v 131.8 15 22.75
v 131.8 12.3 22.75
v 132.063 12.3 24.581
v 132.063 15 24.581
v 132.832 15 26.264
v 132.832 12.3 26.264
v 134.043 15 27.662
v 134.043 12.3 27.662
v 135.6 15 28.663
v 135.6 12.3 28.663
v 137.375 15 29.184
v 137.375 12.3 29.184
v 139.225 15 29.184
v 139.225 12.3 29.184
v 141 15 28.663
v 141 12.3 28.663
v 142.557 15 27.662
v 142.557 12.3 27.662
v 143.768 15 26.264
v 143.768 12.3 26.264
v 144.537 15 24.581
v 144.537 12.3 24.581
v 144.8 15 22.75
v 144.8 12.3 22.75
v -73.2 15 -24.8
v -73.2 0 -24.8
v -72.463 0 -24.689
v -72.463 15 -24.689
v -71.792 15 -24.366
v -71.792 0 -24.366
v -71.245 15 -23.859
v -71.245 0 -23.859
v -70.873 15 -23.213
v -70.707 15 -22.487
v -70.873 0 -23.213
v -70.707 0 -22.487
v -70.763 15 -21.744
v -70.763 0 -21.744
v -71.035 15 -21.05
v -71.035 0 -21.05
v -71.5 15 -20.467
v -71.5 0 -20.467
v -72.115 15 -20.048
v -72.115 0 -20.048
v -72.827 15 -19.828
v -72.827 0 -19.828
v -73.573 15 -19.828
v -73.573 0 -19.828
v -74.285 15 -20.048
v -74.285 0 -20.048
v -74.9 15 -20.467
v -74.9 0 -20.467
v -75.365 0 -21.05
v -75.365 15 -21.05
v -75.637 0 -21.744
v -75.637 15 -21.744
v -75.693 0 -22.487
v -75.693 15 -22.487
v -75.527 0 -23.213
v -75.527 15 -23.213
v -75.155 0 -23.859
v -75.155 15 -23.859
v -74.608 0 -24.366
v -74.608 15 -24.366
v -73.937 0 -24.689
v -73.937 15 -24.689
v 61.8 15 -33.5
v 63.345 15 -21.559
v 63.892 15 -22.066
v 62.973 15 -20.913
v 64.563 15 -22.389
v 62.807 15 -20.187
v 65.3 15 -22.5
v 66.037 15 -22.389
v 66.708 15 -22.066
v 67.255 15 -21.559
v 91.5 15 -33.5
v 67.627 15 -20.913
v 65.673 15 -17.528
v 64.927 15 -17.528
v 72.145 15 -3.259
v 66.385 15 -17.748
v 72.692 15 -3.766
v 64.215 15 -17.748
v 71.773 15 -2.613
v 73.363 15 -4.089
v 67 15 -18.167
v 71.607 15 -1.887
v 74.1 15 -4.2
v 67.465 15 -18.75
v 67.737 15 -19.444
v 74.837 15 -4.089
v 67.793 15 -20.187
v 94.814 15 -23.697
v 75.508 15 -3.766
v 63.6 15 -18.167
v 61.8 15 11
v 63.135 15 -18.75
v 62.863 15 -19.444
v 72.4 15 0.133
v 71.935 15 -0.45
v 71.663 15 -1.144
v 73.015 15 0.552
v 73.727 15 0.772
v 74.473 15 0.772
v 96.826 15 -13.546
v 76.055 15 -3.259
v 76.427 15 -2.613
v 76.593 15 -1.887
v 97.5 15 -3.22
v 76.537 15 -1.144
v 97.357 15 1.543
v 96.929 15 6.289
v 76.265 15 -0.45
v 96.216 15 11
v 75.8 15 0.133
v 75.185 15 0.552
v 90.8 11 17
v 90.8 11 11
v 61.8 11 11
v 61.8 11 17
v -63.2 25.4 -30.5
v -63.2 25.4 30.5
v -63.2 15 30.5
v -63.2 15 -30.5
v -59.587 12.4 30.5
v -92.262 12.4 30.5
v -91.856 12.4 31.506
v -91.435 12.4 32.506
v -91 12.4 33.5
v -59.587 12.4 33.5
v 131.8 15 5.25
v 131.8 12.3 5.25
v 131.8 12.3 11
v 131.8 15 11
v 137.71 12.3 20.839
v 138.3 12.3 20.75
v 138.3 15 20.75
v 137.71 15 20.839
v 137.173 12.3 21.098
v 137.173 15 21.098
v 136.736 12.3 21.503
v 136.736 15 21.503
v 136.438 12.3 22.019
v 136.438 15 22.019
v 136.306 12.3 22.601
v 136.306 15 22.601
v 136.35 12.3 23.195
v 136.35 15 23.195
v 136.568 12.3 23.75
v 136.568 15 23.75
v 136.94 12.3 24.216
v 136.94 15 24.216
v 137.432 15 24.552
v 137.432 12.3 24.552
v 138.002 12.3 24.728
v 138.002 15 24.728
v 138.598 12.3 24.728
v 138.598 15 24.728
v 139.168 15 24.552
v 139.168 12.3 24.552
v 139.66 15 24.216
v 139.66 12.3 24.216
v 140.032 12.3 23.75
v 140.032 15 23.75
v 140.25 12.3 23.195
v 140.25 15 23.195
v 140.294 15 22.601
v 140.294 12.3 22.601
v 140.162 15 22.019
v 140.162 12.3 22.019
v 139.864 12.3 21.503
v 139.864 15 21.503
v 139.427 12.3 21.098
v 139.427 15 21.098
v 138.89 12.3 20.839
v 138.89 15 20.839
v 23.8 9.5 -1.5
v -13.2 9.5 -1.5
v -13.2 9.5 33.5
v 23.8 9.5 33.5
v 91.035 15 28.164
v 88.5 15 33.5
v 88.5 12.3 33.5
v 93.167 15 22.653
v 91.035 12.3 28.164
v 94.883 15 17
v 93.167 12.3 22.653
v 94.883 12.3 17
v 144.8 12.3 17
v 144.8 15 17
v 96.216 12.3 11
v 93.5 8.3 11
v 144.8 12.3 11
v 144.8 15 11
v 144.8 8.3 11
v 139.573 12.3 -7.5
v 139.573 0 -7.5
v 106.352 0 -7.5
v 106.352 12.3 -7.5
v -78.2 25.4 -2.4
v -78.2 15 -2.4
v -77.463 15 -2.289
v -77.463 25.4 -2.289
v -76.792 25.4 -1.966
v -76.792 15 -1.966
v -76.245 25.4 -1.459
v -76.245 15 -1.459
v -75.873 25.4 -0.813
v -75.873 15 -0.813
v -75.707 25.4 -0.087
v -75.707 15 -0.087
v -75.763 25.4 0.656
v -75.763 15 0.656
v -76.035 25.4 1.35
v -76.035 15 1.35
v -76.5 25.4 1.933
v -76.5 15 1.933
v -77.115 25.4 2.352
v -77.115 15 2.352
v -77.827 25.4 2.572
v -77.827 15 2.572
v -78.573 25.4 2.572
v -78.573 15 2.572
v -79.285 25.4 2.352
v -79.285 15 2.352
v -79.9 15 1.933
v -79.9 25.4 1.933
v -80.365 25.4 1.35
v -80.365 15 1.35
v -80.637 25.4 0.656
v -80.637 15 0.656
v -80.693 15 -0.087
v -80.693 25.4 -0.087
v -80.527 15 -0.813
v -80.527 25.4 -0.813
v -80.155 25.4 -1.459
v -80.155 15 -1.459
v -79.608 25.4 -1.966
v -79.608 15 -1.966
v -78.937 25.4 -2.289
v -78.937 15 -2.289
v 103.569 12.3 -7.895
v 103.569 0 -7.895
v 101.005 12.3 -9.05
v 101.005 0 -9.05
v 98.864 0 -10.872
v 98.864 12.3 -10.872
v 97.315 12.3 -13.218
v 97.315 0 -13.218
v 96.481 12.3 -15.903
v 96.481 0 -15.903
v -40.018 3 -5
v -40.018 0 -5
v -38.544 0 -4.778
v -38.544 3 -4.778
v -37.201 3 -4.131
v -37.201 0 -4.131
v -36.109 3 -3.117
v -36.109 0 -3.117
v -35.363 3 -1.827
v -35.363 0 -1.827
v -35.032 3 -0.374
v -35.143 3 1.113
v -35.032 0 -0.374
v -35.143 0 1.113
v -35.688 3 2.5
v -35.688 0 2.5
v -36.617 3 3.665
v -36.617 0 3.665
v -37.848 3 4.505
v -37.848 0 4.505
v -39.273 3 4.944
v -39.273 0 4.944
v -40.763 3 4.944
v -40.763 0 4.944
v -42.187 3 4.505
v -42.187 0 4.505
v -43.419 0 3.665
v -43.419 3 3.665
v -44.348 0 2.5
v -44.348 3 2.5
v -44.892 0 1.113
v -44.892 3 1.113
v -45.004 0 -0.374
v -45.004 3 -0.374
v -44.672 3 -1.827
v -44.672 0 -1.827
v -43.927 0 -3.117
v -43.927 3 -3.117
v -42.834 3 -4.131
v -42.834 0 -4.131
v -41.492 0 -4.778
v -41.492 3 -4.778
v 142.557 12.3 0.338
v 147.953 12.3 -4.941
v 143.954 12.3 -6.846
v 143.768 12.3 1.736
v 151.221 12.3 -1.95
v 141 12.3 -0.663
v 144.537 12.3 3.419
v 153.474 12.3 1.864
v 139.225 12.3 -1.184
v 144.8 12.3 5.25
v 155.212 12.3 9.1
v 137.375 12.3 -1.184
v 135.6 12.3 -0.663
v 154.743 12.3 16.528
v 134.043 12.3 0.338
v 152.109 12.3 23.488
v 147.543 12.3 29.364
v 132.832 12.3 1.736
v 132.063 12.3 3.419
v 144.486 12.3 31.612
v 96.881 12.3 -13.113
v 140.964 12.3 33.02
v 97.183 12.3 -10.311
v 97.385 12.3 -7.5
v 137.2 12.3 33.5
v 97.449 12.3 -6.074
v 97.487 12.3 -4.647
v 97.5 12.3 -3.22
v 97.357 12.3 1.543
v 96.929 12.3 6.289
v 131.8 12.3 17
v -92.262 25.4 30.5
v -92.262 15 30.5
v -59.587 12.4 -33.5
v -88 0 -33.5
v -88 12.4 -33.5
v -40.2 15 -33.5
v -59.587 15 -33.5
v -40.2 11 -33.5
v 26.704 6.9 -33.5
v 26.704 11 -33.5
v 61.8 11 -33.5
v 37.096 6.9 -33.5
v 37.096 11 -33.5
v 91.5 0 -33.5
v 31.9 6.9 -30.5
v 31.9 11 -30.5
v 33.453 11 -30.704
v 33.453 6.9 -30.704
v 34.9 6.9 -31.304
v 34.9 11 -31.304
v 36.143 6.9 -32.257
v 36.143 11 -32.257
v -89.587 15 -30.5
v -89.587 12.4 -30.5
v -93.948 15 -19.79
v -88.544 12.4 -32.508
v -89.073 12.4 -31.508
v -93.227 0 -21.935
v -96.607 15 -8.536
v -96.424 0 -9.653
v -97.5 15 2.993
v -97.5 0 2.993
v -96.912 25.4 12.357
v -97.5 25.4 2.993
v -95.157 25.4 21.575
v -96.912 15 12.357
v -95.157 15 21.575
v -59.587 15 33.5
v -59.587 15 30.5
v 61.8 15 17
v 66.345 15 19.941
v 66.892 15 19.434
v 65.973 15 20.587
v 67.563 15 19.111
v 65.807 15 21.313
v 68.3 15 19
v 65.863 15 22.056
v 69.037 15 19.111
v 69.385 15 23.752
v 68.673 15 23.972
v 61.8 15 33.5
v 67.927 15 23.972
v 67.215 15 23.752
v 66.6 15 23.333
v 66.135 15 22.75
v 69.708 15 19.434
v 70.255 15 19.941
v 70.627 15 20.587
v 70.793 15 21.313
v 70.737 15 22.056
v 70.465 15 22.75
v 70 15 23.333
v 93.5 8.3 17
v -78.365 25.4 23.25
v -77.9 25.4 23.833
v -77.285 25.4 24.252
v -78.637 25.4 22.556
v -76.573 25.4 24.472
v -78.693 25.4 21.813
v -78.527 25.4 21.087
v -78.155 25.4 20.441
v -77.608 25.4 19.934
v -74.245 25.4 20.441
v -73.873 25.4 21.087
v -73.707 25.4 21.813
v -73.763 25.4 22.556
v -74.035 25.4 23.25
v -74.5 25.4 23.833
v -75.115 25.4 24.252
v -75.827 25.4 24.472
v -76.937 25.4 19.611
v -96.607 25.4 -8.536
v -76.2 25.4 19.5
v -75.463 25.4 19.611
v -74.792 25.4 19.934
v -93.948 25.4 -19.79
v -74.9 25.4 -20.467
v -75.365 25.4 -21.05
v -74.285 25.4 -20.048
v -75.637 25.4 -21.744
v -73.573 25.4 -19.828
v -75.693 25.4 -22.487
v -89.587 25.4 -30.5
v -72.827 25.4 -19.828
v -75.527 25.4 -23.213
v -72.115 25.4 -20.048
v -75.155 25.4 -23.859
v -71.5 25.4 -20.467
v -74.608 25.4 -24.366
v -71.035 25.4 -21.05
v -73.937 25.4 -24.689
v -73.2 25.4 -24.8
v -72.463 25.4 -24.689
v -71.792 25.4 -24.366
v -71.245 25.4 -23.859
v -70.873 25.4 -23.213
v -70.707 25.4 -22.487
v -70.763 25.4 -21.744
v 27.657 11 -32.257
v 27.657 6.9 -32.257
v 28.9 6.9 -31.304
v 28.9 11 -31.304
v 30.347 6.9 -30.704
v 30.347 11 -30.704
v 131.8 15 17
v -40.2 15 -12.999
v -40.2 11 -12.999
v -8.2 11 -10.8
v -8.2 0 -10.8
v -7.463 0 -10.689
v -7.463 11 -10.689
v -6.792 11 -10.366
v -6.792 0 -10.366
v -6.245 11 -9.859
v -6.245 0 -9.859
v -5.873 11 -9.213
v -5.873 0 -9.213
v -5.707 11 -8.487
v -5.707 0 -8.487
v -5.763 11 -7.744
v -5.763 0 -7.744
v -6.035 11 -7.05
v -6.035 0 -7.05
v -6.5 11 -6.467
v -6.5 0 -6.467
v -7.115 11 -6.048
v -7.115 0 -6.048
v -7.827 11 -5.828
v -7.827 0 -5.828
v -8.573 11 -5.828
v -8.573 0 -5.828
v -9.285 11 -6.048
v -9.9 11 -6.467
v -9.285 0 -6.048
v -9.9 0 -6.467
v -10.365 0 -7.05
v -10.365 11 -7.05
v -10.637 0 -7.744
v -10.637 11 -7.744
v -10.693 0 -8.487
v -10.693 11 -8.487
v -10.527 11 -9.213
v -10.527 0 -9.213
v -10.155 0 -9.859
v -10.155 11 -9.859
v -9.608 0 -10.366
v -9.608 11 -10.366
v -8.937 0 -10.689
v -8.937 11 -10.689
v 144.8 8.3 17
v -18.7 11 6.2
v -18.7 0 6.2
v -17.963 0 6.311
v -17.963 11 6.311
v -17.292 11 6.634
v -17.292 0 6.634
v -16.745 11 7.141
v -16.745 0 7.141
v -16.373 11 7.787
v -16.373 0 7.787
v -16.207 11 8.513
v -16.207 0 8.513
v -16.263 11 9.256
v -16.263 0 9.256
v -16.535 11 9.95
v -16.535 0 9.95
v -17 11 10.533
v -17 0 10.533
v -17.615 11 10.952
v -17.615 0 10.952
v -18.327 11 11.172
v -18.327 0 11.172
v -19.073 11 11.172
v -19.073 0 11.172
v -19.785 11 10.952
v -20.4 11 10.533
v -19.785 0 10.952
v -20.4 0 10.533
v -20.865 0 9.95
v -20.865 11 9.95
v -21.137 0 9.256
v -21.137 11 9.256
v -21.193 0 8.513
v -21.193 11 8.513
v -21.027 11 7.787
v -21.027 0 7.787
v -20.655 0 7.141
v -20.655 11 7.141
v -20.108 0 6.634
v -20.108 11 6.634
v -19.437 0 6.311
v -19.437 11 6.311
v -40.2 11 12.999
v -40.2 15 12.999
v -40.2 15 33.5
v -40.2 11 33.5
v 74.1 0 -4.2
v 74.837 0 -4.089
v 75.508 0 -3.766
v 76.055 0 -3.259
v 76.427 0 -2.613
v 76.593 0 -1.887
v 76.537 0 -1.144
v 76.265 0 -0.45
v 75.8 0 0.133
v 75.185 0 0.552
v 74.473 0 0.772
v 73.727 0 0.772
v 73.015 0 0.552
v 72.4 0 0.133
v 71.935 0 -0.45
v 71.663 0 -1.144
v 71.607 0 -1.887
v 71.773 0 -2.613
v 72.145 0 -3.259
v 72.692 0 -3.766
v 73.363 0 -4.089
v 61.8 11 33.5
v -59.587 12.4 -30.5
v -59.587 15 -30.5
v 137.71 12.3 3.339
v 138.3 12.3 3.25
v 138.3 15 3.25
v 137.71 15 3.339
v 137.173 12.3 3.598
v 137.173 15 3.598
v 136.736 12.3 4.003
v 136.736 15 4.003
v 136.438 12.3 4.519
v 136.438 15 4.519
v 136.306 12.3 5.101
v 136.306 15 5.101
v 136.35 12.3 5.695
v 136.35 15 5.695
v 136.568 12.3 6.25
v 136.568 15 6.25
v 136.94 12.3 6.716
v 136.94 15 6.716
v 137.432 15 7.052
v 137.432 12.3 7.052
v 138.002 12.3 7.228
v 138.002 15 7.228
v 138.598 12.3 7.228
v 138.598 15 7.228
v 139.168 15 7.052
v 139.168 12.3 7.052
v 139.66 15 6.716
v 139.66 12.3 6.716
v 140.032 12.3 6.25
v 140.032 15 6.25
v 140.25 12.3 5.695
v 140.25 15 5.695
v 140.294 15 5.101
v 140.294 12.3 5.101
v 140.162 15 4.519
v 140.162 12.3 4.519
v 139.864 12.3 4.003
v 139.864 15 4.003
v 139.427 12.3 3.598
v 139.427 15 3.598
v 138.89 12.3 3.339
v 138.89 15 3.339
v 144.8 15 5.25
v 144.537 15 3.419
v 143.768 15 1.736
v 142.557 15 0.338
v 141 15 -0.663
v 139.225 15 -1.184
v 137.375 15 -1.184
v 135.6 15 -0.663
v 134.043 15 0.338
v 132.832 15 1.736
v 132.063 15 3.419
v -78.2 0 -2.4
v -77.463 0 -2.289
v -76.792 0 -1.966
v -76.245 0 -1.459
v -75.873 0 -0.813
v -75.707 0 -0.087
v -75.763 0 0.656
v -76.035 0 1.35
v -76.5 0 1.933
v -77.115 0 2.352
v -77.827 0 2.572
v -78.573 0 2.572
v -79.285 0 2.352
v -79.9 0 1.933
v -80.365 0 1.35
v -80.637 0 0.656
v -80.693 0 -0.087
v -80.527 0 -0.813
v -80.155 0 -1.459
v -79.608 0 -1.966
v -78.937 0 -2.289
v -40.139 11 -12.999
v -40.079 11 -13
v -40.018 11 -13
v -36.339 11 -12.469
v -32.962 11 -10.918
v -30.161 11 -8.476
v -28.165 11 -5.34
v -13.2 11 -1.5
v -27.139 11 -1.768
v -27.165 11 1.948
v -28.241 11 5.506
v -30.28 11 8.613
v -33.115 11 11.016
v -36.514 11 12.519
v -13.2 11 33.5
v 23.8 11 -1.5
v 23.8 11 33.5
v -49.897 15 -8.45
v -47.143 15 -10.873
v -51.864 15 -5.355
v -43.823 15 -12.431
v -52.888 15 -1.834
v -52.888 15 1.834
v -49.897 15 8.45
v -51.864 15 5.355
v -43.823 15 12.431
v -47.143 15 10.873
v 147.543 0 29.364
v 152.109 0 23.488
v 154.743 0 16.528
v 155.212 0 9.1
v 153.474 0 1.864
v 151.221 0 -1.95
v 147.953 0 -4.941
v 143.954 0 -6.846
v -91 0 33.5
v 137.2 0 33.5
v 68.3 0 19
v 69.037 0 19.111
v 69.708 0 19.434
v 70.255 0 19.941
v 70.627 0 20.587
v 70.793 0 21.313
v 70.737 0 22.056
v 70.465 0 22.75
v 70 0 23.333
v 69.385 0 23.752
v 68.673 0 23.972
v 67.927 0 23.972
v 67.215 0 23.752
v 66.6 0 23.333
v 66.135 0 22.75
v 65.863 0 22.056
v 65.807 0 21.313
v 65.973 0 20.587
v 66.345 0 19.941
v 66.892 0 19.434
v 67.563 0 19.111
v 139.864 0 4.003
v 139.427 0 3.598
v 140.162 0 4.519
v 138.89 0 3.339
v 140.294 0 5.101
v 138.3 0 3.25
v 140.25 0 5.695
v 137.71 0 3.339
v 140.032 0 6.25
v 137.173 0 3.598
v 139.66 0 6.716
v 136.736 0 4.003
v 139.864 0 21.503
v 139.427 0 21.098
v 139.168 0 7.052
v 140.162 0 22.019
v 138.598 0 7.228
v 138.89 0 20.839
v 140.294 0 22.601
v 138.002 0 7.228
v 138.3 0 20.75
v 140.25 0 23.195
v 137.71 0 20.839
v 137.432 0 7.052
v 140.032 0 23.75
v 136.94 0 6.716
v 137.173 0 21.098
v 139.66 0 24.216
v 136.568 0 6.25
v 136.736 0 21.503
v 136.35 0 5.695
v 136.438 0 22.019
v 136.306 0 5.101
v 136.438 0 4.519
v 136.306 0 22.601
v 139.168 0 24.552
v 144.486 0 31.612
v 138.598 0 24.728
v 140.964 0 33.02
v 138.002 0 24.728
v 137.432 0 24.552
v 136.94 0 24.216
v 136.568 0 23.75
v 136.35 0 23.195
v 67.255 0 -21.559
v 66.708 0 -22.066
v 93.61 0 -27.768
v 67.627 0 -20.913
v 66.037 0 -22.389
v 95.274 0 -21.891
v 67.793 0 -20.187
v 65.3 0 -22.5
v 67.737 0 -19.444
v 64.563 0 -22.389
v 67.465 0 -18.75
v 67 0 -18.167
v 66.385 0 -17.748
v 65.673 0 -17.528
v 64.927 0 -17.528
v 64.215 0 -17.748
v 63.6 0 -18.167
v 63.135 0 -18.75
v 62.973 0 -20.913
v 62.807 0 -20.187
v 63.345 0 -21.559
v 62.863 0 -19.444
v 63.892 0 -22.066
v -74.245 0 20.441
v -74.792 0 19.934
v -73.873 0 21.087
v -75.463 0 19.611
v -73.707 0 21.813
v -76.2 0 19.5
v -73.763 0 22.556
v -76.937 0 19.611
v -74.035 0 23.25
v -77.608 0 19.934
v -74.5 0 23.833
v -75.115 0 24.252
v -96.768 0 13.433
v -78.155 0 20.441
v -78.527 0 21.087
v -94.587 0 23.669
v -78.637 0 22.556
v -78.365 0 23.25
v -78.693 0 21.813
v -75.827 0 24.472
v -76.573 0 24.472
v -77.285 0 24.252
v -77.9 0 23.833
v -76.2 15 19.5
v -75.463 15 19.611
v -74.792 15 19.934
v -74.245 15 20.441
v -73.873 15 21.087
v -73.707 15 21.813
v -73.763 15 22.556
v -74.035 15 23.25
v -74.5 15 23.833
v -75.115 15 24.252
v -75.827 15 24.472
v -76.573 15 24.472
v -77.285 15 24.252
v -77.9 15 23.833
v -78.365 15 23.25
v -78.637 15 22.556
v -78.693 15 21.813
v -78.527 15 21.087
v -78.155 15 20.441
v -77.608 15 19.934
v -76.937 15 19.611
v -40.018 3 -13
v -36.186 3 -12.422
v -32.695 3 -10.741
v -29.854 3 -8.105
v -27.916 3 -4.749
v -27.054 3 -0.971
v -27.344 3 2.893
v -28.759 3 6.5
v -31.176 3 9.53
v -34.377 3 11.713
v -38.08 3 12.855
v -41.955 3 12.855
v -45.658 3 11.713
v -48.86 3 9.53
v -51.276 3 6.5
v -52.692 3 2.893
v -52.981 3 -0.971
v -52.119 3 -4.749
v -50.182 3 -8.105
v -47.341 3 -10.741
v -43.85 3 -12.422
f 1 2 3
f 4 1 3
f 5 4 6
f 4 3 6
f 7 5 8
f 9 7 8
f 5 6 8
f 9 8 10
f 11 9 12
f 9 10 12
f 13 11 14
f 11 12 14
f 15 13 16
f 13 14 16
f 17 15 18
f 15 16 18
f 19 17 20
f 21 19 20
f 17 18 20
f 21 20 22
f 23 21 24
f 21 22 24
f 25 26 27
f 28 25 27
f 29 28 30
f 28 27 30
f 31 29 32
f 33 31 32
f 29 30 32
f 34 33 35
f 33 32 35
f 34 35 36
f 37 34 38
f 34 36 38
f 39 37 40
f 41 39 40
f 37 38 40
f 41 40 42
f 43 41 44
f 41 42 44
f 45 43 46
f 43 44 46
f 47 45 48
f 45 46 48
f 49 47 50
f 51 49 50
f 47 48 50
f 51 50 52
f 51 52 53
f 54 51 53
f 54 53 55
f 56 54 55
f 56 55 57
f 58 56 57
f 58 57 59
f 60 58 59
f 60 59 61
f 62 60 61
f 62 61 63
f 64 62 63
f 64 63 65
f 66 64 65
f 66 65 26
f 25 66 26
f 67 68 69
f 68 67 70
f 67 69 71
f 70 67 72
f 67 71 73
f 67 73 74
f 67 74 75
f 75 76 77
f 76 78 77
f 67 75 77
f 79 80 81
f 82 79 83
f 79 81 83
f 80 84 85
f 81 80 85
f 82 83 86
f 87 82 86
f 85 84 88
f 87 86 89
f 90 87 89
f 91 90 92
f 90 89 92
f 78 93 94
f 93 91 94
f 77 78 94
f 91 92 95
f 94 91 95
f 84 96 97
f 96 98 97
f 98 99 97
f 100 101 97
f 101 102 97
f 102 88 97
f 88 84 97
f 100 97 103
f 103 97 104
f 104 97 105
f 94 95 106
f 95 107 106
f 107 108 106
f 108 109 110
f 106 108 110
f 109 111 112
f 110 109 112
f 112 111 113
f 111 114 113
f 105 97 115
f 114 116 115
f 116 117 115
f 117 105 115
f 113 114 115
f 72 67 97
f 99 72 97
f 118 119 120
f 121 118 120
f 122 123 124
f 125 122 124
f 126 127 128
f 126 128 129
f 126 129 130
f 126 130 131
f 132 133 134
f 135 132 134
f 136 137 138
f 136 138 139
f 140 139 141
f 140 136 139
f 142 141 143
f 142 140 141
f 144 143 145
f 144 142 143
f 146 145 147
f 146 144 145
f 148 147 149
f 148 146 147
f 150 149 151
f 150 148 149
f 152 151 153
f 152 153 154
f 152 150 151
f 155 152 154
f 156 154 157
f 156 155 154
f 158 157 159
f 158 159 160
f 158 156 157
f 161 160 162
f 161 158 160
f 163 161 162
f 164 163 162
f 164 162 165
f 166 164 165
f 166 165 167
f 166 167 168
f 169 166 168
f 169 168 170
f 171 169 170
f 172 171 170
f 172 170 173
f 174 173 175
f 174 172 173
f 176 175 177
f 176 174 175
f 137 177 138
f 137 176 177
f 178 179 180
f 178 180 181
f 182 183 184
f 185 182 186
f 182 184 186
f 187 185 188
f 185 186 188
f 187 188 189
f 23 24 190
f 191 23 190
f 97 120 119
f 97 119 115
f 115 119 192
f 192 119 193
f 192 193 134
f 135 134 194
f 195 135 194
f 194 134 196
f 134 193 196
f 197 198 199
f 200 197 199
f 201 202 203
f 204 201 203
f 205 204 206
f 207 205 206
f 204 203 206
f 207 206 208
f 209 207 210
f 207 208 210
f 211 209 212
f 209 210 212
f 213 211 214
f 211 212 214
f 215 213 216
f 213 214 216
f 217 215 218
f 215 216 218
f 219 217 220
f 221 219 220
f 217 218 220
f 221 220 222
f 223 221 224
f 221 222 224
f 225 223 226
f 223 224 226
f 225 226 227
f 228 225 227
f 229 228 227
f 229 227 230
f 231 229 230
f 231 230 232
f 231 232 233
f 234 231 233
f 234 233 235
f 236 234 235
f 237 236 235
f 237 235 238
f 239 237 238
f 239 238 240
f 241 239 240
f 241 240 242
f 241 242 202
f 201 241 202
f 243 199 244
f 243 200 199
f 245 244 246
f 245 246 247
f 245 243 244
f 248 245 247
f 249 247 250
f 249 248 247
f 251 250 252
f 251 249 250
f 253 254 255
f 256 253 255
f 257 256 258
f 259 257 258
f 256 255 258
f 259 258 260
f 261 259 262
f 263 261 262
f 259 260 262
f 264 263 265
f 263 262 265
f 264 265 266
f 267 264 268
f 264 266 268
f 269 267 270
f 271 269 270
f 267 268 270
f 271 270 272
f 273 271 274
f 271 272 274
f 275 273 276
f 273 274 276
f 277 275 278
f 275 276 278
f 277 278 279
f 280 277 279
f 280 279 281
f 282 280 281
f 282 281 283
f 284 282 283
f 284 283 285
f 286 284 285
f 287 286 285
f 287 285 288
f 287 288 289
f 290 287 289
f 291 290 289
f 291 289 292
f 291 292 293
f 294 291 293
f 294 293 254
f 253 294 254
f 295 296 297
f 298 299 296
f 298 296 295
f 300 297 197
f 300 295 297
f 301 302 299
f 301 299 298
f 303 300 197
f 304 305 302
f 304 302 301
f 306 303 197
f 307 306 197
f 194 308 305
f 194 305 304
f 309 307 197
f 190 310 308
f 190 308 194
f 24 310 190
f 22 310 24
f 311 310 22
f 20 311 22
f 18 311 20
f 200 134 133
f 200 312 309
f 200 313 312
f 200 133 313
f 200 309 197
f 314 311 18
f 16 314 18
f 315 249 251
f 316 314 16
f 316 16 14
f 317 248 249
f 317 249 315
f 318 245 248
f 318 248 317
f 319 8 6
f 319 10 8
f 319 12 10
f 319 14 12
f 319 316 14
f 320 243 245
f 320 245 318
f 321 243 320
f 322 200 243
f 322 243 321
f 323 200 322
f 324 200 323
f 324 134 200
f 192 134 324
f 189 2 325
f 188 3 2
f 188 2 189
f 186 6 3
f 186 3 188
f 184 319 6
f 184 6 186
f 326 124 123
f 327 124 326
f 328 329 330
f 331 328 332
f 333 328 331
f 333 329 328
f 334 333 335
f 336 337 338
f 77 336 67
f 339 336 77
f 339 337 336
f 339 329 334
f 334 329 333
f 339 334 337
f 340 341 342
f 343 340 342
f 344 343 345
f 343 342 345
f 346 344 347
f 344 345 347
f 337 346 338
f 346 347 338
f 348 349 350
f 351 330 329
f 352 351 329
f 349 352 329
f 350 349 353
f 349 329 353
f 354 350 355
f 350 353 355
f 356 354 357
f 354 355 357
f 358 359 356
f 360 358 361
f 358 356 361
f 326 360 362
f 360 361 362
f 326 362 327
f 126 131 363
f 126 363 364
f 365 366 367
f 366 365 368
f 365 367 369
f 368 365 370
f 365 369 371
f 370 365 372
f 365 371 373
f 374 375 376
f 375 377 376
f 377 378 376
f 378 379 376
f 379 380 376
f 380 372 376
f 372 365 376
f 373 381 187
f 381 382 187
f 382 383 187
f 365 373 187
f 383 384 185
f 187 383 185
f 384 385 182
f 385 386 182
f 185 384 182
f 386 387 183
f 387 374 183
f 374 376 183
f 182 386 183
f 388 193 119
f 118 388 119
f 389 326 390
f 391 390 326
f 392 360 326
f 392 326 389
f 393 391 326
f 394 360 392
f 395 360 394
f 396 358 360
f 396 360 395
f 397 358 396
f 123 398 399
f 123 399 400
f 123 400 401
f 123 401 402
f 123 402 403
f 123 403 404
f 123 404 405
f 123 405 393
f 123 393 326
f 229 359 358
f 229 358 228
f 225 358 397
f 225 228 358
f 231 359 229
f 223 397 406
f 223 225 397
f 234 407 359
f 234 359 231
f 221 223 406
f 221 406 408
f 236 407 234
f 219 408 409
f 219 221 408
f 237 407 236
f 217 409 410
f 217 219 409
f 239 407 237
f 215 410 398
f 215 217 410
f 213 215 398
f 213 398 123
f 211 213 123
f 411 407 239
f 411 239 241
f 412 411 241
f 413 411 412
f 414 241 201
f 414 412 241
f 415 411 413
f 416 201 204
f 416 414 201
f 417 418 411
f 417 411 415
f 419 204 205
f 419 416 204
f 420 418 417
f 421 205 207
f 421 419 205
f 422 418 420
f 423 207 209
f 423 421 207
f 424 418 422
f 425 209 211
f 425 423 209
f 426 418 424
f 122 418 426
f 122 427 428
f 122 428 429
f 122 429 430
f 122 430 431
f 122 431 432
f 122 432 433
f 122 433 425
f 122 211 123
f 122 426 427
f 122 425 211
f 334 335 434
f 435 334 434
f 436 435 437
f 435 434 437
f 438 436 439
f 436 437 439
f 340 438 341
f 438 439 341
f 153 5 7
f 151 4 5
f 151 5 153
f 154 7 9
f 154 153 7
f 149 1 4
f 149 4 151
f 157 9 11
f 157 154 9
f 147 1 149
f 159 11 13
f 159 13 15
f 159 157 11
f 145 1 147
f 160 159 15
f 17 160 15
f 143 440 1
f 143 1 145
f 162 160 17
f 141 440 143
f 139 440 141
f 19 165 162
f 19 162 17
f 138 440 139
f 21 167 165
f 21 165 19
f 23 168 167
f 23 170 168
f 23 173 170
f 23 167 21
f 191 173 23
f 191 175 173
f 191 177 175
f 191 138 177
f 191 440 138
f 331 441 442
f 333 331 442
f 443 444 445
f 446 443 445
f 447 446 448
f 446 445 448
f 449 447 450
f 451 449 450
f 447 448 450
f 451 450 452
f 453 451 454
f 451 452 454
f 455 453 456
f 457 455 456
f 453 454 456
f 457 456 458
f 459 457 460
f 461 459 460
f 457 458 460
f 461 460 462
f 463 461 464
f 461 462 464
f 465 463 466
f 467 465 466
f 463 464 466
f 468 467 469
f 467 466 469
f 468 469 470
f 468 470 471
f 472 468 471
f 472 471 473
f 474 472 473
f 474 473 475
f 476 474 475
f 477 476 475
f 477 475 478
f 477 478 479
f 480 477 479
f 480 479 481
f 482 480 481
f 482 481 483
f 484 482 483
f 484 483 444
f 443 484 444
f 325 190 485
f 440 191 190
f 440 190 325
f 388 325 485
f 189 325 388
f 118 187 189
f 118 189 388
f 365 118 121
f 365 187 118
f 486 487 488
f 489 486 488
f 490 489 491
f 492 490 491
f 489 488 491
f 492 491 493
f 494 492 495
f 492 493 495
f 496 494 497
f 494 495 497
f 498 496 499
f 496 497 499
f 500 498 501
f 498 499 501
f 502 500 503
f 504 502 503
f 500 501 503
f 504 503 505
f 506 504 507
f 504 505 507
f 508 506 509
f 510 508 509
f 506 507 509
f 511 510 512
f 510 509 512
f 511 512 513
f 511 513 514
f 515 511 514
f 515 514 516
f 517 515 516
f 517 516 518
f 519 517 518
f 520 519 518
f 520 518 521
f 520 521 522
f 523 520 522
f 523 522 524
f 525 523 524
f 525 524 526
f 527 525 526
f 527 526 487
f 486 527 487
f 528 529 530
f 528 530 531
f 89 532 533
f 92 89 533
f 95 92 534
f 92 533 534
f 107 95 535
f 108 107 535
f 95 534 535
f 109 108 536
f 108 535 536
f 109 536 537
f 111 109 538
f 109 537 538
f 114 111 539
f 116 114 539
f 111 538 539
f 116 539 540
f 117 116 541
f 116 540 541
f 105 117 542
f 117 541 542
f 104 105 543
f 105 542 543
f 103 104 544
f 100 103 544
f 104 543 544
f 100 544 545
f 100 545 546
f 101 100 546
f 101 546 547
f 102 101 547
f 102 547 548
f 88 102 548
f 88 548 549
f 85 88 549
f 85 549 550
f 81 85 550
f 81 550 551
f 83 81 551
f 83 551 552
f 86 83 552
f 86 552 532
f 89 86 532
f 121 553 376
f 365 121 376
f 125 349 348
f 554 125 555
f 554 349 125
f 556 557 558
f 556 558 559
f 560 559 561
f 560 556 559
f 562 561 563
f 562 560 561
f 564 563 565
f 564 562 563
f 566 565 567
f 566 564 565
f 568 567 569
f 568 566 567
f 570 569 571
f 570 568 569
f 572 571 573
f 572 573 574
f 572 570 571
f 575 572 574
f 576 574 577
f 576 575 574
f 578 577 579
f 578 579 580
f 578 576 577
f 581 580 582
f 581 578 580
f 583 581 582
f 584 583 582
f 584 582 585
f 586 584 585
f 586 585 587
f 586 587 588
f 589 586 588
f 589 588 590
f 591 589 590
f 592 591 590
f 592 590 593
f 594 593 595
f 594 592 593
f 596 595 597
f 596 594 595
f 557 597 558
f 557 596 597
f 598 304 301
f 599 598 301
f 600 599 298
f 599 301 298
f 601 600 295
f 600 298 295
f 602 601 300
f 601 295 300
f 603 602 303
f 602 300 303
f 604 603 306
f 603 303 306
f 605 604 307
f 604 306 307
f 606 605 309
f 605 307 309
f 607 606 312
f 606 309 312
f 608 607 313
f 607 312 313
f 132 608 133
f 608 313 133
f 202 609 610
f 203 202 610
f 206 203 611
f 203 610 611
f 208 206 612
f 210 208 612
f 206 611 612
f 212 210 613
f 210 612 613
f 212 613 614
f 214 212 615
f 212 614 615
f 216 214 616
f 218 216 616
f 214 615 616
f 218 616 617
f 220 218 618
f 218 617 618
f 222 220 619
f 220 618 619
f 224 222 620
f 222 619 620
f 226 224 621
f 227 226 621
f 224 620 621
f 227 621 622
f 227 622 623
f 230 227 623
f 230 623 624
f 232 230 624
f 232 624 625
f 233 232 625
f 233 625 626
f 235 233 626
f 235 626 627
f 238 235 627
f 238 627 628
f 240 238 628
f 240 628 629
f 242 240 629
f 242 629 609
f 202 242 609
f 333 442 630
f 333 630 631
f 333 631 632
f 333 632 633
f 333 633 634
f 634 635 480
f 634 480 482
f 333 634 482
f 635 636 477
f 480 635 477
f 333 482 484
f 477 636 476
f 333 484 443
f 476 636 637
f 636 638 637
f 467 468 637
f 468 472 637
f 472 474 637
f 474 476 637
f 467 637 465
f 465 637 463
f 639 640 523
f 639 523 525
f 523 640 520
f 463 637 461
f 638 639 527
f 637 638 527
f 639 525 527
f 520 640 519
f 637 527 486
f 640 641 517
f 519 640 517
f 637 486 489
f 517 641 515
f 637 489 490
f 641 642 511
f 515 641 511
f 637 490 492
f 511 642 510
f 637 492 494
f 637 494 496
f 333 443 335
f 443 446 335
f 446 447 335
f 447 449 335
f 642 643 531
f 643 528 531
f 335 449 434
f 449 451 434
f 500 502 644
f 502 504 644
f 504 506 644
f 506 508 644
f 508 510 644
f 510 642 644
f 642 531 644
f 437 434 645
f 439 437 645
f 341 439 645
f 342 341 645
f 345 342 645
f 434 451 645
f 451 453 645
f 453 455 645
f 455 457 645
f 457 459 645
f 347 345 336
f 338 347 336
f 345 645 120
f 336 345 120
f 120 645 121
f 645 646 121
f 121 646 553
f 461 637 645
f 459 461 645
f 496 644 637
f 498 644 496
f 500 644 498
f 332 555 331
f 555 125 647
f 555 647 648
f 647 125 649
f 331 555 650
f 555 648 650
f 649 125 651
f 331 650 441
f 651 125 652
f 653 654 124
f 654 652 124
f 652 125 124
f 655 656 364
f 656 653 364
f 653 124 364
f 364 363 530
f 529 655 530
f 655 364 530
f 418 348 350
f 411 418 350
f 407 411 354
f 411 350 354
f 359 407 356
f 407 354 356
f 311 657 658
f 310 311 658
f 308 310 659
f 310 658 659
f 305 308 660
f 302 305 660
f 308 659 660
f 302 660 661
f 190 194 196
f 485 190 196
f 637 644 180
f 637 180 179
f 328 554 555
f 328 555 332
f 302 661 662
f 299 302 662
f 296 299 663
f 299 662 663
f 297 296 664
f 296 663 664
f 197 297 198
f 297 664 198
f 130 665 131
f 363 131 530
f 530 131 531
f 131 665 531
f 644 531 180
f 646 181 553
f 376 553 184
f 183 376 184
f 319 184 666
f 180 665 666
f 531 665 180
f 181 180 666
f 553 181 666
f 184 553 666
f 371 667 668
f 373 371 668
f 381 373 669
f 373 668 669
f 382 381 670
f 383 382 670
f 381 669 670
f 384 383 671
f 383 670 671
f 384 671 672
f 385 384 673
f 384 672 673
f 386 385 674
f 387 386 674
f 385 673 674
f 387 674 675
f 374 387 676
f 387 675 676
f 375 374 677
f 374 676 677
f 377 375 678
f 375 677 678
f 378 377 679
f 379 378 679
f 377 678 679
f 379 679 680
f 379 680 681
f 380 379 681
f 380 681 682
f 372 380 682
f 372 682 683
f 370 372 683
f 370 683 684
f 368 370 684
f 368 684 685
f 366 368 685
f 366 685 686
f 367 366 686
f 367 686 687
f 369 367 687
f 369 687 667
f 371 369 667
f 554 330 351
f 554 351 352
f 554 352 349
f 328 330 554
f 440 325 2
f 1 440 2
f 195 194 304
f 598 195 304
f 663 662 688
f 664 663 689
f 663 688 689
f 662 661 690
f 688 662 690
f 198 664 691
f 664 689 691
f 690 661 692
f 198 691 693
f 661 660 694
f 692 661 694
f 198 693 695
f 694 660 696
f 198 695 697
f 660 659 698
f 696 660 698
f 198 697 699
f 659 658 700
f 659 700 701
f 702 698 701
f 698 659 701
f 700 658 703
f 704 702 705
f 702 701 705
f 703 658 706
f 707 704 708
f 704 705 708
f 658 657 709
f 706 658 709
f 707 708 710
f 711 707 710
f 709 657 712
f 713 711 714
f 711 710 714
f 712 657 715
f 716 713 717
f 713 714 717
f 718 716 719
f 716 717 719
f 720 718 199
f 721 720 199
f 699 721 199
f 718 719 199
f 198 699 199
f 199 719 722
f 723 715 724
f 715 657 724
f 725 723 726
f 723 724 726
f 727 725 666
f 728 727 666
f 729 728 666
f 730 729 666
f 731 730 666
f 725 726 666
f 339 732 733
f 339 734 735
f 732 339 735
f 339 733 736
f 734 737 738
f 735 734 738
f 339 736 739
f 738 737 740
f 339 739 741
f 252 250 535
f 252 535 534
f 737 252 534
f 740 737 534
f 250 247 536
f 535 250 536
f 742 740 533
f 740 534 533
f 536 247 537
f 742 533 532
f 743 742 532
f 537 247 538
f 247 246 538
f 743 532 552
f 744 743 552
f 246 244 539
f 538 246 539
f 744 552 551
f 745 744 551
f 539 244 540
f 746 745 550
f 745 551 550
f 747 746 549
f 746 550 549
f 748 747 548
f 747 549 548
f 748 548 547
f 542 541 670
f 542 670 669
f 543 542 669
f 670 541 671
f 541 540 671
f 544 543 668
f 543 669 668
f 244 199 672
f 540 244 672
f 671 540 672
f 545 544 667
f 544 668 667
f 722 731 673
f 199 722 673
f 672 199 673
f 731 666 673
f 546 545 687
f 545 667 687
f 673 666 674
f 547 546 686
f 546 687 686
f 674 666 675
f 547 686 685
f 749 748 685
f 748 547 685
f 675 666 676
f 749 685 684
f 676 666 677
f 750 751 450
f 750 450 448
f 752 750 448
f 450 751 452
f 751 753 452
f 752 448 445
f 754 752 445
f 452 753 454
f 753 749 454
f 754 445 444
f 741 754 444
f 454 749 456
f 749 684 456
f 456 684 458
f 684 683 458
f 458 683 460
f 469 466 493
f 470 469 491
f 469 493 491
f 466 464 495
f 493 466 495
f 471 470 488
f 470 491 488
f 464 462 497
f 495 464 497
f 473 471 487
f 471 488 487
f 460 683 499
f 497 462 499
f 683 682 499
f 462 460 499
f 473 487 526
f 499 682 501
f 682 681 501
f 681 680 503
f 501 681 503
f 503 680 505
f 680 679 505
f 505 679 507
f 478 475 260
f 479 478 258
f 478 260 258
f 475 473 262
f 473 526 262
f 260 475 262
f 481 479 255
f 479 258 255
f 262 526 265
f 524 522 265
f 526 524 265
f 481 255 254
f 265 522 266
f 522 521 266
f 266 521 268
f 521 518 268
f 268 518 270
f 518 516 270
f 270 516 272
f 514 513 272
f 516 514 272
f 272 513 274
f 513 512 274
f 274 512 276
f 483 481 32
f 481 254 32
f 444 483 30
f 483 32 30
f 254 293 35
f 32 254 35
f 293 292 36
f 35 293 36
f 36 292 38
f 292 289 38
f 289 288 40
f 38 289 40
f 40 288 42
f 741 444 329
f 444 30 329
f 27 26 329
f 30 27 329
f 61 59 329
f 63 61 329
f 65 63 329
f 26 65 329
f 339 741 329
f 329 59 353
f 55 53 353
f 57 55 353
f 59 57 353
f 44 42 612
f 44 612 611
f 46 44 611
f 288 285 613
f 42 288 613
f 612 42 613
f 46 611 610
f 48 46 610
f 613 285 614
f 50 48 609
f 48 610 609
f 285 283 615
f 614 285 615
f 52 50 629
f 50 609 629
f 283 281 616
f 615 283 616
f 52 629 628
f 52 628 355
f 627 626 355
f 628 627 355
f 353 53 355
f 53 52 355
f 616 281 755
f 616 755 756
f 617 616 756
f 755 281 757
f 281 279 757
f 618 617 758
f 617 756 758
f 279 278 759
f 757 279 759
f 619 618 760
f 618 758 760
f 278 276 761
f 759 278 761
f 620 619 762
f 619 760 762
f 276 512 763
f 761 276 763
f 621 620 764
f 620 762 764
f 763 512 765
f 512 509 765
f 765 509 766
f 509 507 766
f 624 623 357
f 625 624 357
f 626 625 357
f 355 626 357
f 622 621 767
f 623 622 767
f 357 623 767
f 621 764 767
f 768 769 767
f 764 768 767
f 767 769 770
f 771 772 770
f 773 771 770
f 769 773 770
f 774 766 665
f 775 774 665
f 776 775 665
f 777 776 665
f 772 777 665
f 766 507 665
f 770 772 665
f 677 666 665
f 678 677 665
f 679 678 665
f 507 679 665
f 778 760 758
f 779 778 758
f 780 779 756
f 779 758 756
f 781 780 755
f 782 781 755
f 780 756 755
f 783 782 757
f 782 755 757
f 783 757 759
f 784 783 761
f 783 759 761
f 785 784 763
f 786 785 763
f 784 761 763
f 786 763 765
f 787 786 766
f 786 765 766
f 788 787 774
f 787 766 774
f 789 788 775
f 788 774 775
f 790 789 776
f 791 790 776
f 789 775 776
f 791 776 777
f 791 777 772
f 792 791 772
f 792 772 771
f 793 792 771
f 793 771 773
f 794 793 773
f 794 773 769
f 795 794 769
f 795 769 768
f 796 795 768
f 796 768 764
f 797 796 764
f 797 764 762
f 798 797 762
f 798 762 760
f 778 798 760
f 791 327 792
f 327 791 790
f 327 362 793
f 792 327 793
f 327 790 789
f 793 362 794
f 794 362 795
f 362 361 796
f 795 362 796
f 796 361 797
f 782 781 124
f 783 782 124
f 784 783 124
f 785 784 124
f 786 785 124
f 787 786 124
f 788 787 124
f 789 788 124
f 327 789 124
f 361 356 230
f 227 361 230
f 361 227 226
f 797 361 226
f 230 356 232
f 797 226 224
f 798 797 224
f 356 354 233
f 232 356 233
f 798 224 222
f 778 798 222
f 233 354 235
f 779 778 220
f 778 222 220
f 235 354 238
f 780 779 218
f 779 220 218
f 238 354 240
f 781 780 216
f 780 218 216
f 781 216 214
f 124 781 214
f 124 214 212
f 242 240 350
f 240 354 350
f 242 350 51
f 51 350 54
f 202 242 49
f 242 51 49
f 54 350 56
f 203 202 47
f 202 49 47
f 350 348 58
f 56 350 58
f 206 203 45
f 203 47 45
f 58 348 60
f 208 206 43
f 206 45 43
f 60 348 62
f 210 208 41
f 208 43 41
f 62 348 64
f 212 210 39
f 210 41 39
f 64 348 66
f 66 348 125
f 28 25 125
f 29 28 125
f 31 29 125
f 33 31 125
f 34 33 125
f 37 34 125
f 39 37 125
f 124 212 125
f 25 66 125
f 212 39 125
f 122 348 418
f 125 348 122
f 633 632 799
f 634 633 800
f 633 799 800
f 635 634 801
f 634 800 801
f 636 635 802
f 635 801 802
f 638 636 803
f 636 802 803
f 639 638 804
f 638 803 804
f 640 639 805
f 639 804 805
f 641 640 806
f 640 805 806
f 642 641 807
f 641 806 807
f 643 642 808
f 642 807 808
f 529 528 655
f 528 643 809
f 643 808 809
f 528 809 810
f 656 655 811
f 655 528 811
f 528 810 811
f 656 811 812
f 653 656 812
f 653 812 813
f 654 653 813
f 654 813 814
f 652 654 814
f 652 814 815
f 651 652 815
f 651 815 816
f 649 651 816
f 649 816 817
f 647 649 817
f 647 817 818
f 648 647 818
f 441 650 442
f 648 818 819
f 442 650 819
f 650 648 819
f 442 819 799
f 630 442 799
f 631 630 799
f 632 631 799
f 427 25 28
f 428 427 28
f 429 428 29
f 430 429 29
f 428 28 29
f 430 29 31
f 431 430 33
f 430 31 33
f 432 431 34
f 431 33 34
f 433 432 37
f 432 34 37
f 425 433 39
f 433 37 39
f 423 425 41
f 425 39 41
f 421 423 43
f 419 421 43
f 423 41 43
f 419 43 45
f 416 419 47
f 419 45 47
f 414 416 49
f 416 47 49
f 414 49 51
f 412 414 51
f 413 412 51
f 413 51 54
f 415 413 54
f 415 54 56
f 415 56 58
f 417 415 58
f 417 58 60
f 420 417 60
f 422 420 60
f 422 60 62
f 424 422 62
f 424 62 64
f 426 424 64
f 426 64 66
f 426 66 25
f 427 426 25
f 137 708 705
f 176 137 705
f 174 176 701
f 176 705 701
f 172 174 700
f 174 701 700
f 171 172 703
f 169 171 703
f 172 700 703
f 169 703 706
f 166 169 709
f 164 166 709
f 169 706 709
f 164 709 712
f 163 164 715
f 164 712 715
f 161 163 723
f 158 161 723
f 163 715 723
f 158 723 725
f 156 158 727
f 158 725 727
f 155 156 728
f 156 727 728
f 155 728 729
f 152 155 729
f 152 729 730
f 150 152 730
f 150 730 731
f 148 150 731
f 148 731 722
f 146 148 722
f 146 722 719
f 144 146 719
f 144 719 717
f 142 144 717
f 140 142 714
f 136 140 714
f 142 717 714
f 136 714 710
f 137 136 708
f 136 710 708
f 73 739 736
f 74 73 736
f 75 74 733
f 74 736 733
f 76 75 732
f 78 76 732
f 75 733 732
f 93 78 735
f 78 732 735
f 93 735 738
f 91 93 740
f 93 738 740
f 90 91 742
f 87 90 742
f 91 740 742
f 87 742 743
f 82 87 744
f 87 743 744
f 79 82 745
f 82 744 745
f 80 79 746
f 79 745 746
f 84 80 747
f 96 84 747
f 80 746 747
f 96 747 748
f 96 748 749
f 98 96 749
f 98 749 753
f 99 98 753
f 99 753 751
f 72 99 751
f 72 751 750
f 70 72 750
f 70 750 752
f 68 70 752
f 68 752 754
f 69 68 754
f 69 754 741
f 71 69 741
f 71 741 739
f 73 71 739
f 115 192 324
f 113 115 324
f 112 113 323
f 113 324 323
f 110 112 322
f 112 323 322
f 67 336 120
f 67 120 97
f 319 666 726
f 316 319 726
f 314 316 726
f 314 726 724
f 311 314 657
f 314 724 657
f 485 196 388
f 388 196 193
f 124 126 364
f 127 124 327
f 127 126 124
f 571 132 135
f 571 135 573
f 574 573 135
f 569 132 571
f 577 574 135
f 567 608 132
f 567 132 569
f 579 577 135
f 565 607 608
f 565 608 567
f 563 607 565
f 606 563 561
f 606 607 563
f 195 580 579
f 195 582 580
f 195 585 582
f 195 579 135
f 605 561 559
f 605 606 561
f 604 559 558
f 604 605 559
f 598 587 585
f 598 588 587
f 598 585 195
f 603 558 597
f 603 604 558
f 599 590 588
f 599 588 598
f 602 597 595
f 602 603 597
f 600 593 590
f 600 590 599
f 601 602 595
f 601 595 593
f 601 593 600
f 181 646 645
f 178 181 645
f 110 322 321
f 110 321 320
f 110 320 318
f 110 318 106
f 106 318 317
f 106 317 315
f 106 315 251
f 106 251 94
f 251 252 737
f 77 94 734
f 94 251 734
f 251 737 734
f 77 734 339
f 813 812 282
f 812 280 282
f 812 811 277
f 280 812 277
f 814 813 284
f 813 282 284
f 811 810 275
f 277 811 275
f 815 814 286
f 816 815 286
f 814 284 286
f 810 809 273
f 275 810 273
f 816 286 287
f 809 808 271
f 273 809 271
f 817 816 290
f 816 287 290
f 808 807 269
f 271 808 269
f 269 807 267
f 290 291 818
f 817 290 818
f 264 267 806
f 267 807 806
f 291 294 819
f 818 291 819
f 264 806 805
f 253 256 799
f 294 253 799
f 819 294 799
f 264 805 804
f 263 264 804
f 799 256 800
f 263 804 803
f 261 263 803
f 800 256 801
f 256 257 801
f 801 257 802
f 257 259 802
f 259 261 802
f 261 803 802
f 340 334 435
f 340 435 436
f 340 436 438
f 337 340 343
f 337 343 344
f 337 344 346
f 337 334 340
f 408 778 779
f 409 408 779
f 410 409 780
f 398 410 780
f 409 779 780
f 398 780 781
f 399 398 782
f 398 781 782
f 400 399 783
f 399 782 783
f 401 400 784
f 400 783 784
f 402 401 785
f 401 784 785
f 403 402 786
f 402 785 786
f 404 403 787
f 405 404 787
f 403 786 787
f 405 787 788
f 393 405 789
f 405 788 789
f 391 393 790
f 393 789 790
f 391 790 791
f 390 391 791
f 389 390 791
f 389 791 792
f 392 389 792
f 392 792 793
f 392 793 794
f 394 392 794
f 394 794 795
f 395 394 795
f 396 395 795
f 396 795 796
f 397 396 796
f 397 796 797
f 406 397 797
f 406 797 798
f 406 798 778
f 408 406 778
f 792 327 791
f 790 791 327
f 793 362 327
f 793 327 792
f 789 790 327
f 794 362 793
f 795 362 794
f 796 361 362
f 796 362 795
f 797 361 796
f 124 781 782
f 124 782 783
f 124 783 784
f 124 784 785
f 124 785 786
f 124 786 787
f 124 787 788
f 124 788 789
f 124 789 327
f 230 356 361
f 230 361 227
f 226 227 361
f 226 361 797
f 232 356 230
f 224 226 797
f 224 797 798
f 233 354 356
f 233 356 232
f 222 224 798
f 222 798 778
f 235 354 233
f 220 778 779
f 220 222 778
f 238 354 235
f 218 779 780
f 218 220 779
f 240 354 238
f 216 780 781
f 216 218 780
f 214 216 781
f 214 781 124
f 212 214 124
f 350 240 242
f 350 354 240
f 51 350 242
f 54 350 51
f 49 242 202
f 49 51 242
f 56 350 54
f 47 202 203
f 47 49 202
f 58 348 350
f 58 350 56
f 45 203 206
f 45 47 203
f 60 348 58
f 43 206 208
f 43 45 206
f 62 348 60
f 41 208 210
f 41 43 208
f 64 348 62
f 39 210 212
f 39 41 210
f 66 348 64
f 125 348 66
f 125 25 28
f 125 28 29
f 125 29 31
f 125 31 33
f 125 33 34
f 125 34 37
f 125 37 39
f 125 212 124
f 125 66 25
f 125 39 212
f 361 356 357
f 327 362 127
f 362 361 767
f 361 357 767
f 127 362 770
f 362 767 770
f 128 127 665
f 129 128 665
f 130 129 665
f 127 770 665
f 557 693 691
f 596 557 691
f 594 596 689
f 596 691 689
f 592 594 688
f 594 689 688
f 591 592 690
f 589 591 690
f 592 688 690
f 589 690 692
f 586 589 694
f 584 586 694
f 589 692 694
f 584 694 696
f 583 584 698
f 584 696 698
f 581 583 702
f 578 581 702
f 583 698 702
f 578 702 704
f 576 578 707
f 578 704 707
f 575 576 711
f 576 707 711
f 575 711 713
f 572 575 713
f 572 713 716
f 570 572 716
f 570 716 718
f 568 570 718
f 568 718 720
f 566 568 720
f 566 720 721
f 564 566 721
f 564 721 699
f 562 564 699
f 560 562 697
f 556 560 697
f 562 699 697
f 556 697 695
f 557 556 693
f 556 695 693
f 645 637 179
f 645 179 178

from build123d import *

# Parameters (mm, degrees)
SKETCH1_W           = 195
SKETCH1_H           = 67
BOSS_EXTRUDE1_DEPTH = 25.4
CUT_EXTRUDE1_DEPTH  = 107.177492907
CUT_EXTRUDE2_DEPTH  = 121.997561959
CUT_EXTRUDE3_START  = -13
SKETCH4_W           = 3.612655346
SKETCH4_H           = 3
CUT_EXTRUDE3_DEPTH  = 13
SKETCH6_R           = 2.5
CUT_EXTRUDE4_DEPTH  = 107.177492907
SKETCH7_W           = 37
SKETCH7_H           = 35
CUT_EXTRUDE5_DEPTH  = 1.5
CUT_EXTRUDE6_DEPTH  = 18.5
SKETCH9_R           = 2
BOSS_EXTRUDE2_DEPTH = 12.3
FILLET1_R           = 10
CUT_EXTRUDE7_REACH  = 165.895
CUT_EXTRUDE7_START  = -3
SKETCH10_R          = 13
SKETCH13_R          = 5
CUT_EXTRUDE9_DEPTH  = 161.89488962
SKETCH11_R          = 2
BOSS_EXTRUDE3_DEPTH = 2.7
CUT_EXTRUDE8_DEPTH  = 6


# Read off the part's stored shape, not the designer's step: Split1
with BuildPart() as part:
    # Sketch1 → Boss-Extrude1 (new body)
    with BuildSketch(Plane(origin=(0, 0, 0), x_dir=(1, 0, 0), z_dir=(0, 1, 0))):
        Rectangle(SKETCH1_W, SKETCH1_H)
    extrude(amount=BOSS_EXTRUDE1_DEPTH)

    # Sketch2 → Cut-Extrude1 (cut, through all)
    with BuildSketch(Plane.XZ):
        with BuildLine():
            Line((97.5, -3.219751644), (97.5, 33.5))
            Line((97.5, 33.5), (88.5, 33.5))
            ThreePointArc((88.5, 33.5), (95.217186872, 15.683556008), (97.5, -3.219751644))
        make_face()
        with BuildLine():
            Line((97.5, -33.5), (97.5, -3.219751644))
            ThreePointArc((97.5, -3.219751644), (95.985558513, -18.65423771), (91.5, -33.5))
            Line((91.5, -33.5), (97.5, -33.5))
        make_face()
        with BuildLine():
            ThreePointArc((-88, -33.5), (-95.08607052, -15.861694529), (-97.5, 2.992884749))
            Line((-97.5, 2.992884749), (-97.5, -33.5))
            Line((-97.5, -33.5), (-88, -33.5))
        make_face()
        with BuildLine():
            ThreePointArc((-97.5, 2.992884749), (-95.856964648, 18.588830376), (-91, 33.5))
            Line((-91, 33.5), (-97.5, 33.5))
            Line((-97.5, 33.5), (-97.5, 2.992884749))
        make_face()
    extrude(amount=-CUT_EXTRUDE1_DEPTH, mode=Mode.SUBTRACT)

    # Sketch3 → Cut-Extrude2 (cut, through all)
    with BuildSketch(Plane(origin=(0, 0, 33.5), x_dir=(-1, 0, 0), z_dir=(0, 0, -1))):
        Polygon((63.2, 25.4), (63.2, 15), (40.2, 15), (40.2, 11), (-61.8, 11), (-61.8, 15), (-97.5, 15), (-97.5, 25.4), align=None)
    extrude(amount=CUT_EXTRUDE2_DEPTH, mode=Mode.SUBTRACT)

    # Sketch4 → Cut-Extrude3 (cut)
    with BuildSketch(Plane(origin=(0, 25.4, 0), x_dir=(1, 0, 0), z_dir=(0, 1, 0)).offset(CUT_EXTRUDE3_START)):
        with BuildLine():
            Line((-63.2, 30.5), (-63.2, 33.5))
            Line((-63.2, 33.5), (-88, 33.5))
            ThreePointArc((-88, 33.5), (-88.810680862, 32.008999469), (-89.587344654, 30.5))
            Line((-89.587344654, 30.5), (-63.2, 30.5))
        make_face()
        with Locations((-61.393672327, 32)):
            Rectangle(SKETCH4_W, SKETCH4_H)
        with BuildLine():
            Line((-63.2, -33.5), (-63.2, -30.5))
            Line((-63.2, -30.5), (-92.261692194, -30.5))
            ThreePointArc((-92.261692194, -30.5), (-91.647155152, -32.006859002), (-91, -33.5))
            Line((-91, -33.5), (-63.2, -33.5))
        make_face()
        with Locations((-61.393672327, -32)):
            Rectangle(SKETCH4_W, SKETCH4_H)
    extrude(amount=CUT_EXTRUDE3_DEPTH, mode=Mode.SUBTRACT)

    # Sketch6 → Cut-Extrude4 (cut, through all)
    with BuildSketch(Plane.XZ):
        with Locations(Location((-18.7, 8.7, 0), (0, 0, 270))):
            Circle(SKETCH6_R)
        with Locations(Location((74.1, -1.7, 0), (0, 0, 270))):
            Circle(SKETCH6_R)
        with Locations(Location((68.3, 21.5, 0), (0, 0, 270))):
            Circle(SKETCH6_R)
        with Locations(Location((65.3, -20, 0), (0, 0, 270))):
            Circle(SKETCH6_R)
        with Locations(Location((-8.2, -8.3, 0), (0, 0, 270))):
            Circle(SKETCH6_R)
        with Locations(Location((-76.2, 22, 0), (0, 0, 270))):
            Circle(SKETCH6_R)
        with Locations(Location((-78.2, 0.1, 0), (0, 0, 270))):
            Circle(SKETCH6_R)
        with Locations(Location((-73.2, -22.3, 0), (0, 0, 270))):
            Circle(SKETCH6_R)
    extrude(amount=-CUT_EXTRUDE4_DEPTH, mode=Mode.SUBTRACT)

    # Sketch7 → Cut-Extrude5 (cut)
    with BuildSketch(Plane(origin=(0, 11, 0), x_dir=(1, 0, 0), z_dir=(0, 1, 0))):
        with Locations((5.3, -16)):
            Rectangle(SKETCH7_W, SKETCH7_H)
    extrude(amount=-CUT_EXTRUDE5_DEPTH, mode=Mode.SUBTRACT)

    # Sketch8 → Cut-Extrude6 (cut)
    with BuildSketch(Plane(origin=(0, 25.4, 0), x_dir=(1, 0, 0), z_dir=(0, 1, 0))):
        with BuildLine():
            Line((37.096152423, 33.5), (31.9, 33.5))
            Line((31.9, 33.5), (31.9, 30.5))
            ThreePointArc((31.9, 30.5), (34.9, 31.303847577), (37.096152423, 33.5))
        make_face()
        with BuildLine():
            Line((31.9, 33.5), (26.703847577, 33.5))
            ThreePointArc((26.703847577, 33.5), (28.9, 31.303847577), (31.9, 30.5))
            Line((31.9, 30.5), (31.9, 33.5))
        make_face()
    extrude(amount=-CUT_EXTRUDE6_DEPTH, mode=Mode.SUBTRACT)

    # Sketch9 → Boss-Extrude2 (add)
    with BuildSketch(Plane.XZ):
        with BuildLine():
            Line((88.5, 33.5), (137.200361796, 33.5))
            ThreePointArc((137.200361796, 33.5), (142.769729546, 32.427747228), (147.542861296, 29.364285714))
            ThreePointArc((147.542861296, 29.364285714), (154.743476693, 16.527679502), (153.473750823, 1.864285714))
            ThreePointArc((153.473750823, 1.864285714), (147.953179578, -4.940573023), (139.572717606, -7.5))
            Line((139.572717606, -7.5), (97.384558849, -7.5))
            ThreePointArc((97.384558849, -7.5), (95.698800641, 13.597328658), (88.5, 33.5))
        make_face()
        with Locations(Location((138.3, 5.25, 0), (0, 0, 270))):
            Circle(SKETCH9_R, mode=Mode.SUBTRACT)
        with Locations(Location((138.3, 22.75, 0), (0, 0, 270))):
            Circle(SKETCH9_R, mode=Mode.SUBTRACT)
    extrude(amount=-BOSS_EXTRUDE2_DEPTH)

    # Fillet1
    fillet1_edges = [part.edges().sort_by_distance(p)[0] for p in [
        (97.384558849, 6.15, -7.5),
    ]]
    fillet(fillet1_edges, radius=FILLET1_R)

    # Cut-Extrude7: up to this face of the body (flat: up to its plane)
    cut_extrude7_end = Plane(part.part.faces().sort_by_distance((-51.561702064, 15, 0))[0])
    # Sketch10 → Cut-Extrude7 (cut, up to the picked face)
    with BuildSketch(Plane.XZ.offset(CUT_EXTRUDE7_START), mode=Mode.PRIVATE) as cut_extrude7_sk1:
        with Locations(Location((-40.017782272, 0, 0), (0, 0, 270))):
            Circle(SKETCH10_R)
    cut_extrude7_tool1 = split(extrude(cut_extrude7_sk1.sketch, amount=-CUT_EXTRUDE7_REACH, mode=Mode.PRIVATE), bisect_by=cut_extrude7_end, keep=Keep.BOTH, mode=Mode.PRIVATE)
    add(cut_extrude7_tool1.solids().sort_by(Axis((-40.017782, 3, 0), (0, 1, 0)))[0], mode=Mode.SUBTRACT)

    # Sketch13 → Cut-Extrude9 (cut, through all)
    with BuildSketch(Plane.XZ):
        with Locations(Location((-40.017782272, 0, 0), (0, 0, 270))):
            Circle(SKETCH13_R)
    extrude(amount=-CUT_EXTRUDE9_DEPTH, mode=Mode.SUBTRACT)

    # Sketch11 → Boss-Extrude3 (add)
    # profile 1 of 2: a face of its own
    with BuildSketch(Plane(origin=(0, 12.3, 0), x_dir=(1, 0, 0), z_dir=(0, 1, 0))):
        with BuildLine():
            Line((144.8, -11), (144.8, -5.25))
            ThreePointArc((144.8, -5.25), (138.3, 1.25), (131.8, -5.25))
            Line((131.8, -5.25), (131.8, -11))
            Line((131.8, -11), (144.8, -11))
        make_face()
        with Locations(Location((138.3, -5.25, 0), (0, 0, 90))):
            Circle(SKETCH11_R, mode=Mode.SUBTRACT)
    # profile 2 of 2: a face of its own
    with BuildSketch(Plane(origin=(0, 12.3, 0), x_dir=(1, 0, 0), z_dir=(0, 1, 0))):
        with BuildLine():
            Line((144.8, -22.75), (144.8, -17))
            Line((144.8, -17), (131.8, -17))
            Line((131.8, -17), (131.8, -22.75))
            ThreePointArc((131.8, -22.75), (138.3, -29.25), (144.8, -22.75))
        make_face()
        with Locations(Location((138.3, -22.75, 0), (0, 0, 90))):
            Circle(SKETCH11_R, mode=Mode.SUBTRACT)
    extrude(amount=BOSS_EXTRUDE3_DEPTH)


with BuildPart() as body_2:
    # Split1: the piece on the far side of the plane
    add(part.part)
    split(bisect_by=Plane(origin=(0, 15, 0), x_dir=(1, 0, 0), z_dir=(0, 1, 0)), keep=Keep.BOTTOM)

    # Sketch12 → Cut-Extrude8 (cut)
    with BuildSketch(Plane.XY.offset(11)):
        Polygon((144.8, 15), (144.8, 8.3), (93.5, 8.3), (90.8, 11), (61.8, 11), (61.8, 15), align=None)
    extrude(amount=CUT_EXTRUDE8_DEPTH, mode=Mode.SUBTRACT)


with BuildPart() as part_1:
    add(part.part)

    # Split1
    split(bisect_by=Plane(origin=(0, 15, 0), x_dir=(1, 0, 0), z_dir=(0, 1, 0)), keep=Keep.TOP)


solid = Compound([body_2.part, part_1.part])
